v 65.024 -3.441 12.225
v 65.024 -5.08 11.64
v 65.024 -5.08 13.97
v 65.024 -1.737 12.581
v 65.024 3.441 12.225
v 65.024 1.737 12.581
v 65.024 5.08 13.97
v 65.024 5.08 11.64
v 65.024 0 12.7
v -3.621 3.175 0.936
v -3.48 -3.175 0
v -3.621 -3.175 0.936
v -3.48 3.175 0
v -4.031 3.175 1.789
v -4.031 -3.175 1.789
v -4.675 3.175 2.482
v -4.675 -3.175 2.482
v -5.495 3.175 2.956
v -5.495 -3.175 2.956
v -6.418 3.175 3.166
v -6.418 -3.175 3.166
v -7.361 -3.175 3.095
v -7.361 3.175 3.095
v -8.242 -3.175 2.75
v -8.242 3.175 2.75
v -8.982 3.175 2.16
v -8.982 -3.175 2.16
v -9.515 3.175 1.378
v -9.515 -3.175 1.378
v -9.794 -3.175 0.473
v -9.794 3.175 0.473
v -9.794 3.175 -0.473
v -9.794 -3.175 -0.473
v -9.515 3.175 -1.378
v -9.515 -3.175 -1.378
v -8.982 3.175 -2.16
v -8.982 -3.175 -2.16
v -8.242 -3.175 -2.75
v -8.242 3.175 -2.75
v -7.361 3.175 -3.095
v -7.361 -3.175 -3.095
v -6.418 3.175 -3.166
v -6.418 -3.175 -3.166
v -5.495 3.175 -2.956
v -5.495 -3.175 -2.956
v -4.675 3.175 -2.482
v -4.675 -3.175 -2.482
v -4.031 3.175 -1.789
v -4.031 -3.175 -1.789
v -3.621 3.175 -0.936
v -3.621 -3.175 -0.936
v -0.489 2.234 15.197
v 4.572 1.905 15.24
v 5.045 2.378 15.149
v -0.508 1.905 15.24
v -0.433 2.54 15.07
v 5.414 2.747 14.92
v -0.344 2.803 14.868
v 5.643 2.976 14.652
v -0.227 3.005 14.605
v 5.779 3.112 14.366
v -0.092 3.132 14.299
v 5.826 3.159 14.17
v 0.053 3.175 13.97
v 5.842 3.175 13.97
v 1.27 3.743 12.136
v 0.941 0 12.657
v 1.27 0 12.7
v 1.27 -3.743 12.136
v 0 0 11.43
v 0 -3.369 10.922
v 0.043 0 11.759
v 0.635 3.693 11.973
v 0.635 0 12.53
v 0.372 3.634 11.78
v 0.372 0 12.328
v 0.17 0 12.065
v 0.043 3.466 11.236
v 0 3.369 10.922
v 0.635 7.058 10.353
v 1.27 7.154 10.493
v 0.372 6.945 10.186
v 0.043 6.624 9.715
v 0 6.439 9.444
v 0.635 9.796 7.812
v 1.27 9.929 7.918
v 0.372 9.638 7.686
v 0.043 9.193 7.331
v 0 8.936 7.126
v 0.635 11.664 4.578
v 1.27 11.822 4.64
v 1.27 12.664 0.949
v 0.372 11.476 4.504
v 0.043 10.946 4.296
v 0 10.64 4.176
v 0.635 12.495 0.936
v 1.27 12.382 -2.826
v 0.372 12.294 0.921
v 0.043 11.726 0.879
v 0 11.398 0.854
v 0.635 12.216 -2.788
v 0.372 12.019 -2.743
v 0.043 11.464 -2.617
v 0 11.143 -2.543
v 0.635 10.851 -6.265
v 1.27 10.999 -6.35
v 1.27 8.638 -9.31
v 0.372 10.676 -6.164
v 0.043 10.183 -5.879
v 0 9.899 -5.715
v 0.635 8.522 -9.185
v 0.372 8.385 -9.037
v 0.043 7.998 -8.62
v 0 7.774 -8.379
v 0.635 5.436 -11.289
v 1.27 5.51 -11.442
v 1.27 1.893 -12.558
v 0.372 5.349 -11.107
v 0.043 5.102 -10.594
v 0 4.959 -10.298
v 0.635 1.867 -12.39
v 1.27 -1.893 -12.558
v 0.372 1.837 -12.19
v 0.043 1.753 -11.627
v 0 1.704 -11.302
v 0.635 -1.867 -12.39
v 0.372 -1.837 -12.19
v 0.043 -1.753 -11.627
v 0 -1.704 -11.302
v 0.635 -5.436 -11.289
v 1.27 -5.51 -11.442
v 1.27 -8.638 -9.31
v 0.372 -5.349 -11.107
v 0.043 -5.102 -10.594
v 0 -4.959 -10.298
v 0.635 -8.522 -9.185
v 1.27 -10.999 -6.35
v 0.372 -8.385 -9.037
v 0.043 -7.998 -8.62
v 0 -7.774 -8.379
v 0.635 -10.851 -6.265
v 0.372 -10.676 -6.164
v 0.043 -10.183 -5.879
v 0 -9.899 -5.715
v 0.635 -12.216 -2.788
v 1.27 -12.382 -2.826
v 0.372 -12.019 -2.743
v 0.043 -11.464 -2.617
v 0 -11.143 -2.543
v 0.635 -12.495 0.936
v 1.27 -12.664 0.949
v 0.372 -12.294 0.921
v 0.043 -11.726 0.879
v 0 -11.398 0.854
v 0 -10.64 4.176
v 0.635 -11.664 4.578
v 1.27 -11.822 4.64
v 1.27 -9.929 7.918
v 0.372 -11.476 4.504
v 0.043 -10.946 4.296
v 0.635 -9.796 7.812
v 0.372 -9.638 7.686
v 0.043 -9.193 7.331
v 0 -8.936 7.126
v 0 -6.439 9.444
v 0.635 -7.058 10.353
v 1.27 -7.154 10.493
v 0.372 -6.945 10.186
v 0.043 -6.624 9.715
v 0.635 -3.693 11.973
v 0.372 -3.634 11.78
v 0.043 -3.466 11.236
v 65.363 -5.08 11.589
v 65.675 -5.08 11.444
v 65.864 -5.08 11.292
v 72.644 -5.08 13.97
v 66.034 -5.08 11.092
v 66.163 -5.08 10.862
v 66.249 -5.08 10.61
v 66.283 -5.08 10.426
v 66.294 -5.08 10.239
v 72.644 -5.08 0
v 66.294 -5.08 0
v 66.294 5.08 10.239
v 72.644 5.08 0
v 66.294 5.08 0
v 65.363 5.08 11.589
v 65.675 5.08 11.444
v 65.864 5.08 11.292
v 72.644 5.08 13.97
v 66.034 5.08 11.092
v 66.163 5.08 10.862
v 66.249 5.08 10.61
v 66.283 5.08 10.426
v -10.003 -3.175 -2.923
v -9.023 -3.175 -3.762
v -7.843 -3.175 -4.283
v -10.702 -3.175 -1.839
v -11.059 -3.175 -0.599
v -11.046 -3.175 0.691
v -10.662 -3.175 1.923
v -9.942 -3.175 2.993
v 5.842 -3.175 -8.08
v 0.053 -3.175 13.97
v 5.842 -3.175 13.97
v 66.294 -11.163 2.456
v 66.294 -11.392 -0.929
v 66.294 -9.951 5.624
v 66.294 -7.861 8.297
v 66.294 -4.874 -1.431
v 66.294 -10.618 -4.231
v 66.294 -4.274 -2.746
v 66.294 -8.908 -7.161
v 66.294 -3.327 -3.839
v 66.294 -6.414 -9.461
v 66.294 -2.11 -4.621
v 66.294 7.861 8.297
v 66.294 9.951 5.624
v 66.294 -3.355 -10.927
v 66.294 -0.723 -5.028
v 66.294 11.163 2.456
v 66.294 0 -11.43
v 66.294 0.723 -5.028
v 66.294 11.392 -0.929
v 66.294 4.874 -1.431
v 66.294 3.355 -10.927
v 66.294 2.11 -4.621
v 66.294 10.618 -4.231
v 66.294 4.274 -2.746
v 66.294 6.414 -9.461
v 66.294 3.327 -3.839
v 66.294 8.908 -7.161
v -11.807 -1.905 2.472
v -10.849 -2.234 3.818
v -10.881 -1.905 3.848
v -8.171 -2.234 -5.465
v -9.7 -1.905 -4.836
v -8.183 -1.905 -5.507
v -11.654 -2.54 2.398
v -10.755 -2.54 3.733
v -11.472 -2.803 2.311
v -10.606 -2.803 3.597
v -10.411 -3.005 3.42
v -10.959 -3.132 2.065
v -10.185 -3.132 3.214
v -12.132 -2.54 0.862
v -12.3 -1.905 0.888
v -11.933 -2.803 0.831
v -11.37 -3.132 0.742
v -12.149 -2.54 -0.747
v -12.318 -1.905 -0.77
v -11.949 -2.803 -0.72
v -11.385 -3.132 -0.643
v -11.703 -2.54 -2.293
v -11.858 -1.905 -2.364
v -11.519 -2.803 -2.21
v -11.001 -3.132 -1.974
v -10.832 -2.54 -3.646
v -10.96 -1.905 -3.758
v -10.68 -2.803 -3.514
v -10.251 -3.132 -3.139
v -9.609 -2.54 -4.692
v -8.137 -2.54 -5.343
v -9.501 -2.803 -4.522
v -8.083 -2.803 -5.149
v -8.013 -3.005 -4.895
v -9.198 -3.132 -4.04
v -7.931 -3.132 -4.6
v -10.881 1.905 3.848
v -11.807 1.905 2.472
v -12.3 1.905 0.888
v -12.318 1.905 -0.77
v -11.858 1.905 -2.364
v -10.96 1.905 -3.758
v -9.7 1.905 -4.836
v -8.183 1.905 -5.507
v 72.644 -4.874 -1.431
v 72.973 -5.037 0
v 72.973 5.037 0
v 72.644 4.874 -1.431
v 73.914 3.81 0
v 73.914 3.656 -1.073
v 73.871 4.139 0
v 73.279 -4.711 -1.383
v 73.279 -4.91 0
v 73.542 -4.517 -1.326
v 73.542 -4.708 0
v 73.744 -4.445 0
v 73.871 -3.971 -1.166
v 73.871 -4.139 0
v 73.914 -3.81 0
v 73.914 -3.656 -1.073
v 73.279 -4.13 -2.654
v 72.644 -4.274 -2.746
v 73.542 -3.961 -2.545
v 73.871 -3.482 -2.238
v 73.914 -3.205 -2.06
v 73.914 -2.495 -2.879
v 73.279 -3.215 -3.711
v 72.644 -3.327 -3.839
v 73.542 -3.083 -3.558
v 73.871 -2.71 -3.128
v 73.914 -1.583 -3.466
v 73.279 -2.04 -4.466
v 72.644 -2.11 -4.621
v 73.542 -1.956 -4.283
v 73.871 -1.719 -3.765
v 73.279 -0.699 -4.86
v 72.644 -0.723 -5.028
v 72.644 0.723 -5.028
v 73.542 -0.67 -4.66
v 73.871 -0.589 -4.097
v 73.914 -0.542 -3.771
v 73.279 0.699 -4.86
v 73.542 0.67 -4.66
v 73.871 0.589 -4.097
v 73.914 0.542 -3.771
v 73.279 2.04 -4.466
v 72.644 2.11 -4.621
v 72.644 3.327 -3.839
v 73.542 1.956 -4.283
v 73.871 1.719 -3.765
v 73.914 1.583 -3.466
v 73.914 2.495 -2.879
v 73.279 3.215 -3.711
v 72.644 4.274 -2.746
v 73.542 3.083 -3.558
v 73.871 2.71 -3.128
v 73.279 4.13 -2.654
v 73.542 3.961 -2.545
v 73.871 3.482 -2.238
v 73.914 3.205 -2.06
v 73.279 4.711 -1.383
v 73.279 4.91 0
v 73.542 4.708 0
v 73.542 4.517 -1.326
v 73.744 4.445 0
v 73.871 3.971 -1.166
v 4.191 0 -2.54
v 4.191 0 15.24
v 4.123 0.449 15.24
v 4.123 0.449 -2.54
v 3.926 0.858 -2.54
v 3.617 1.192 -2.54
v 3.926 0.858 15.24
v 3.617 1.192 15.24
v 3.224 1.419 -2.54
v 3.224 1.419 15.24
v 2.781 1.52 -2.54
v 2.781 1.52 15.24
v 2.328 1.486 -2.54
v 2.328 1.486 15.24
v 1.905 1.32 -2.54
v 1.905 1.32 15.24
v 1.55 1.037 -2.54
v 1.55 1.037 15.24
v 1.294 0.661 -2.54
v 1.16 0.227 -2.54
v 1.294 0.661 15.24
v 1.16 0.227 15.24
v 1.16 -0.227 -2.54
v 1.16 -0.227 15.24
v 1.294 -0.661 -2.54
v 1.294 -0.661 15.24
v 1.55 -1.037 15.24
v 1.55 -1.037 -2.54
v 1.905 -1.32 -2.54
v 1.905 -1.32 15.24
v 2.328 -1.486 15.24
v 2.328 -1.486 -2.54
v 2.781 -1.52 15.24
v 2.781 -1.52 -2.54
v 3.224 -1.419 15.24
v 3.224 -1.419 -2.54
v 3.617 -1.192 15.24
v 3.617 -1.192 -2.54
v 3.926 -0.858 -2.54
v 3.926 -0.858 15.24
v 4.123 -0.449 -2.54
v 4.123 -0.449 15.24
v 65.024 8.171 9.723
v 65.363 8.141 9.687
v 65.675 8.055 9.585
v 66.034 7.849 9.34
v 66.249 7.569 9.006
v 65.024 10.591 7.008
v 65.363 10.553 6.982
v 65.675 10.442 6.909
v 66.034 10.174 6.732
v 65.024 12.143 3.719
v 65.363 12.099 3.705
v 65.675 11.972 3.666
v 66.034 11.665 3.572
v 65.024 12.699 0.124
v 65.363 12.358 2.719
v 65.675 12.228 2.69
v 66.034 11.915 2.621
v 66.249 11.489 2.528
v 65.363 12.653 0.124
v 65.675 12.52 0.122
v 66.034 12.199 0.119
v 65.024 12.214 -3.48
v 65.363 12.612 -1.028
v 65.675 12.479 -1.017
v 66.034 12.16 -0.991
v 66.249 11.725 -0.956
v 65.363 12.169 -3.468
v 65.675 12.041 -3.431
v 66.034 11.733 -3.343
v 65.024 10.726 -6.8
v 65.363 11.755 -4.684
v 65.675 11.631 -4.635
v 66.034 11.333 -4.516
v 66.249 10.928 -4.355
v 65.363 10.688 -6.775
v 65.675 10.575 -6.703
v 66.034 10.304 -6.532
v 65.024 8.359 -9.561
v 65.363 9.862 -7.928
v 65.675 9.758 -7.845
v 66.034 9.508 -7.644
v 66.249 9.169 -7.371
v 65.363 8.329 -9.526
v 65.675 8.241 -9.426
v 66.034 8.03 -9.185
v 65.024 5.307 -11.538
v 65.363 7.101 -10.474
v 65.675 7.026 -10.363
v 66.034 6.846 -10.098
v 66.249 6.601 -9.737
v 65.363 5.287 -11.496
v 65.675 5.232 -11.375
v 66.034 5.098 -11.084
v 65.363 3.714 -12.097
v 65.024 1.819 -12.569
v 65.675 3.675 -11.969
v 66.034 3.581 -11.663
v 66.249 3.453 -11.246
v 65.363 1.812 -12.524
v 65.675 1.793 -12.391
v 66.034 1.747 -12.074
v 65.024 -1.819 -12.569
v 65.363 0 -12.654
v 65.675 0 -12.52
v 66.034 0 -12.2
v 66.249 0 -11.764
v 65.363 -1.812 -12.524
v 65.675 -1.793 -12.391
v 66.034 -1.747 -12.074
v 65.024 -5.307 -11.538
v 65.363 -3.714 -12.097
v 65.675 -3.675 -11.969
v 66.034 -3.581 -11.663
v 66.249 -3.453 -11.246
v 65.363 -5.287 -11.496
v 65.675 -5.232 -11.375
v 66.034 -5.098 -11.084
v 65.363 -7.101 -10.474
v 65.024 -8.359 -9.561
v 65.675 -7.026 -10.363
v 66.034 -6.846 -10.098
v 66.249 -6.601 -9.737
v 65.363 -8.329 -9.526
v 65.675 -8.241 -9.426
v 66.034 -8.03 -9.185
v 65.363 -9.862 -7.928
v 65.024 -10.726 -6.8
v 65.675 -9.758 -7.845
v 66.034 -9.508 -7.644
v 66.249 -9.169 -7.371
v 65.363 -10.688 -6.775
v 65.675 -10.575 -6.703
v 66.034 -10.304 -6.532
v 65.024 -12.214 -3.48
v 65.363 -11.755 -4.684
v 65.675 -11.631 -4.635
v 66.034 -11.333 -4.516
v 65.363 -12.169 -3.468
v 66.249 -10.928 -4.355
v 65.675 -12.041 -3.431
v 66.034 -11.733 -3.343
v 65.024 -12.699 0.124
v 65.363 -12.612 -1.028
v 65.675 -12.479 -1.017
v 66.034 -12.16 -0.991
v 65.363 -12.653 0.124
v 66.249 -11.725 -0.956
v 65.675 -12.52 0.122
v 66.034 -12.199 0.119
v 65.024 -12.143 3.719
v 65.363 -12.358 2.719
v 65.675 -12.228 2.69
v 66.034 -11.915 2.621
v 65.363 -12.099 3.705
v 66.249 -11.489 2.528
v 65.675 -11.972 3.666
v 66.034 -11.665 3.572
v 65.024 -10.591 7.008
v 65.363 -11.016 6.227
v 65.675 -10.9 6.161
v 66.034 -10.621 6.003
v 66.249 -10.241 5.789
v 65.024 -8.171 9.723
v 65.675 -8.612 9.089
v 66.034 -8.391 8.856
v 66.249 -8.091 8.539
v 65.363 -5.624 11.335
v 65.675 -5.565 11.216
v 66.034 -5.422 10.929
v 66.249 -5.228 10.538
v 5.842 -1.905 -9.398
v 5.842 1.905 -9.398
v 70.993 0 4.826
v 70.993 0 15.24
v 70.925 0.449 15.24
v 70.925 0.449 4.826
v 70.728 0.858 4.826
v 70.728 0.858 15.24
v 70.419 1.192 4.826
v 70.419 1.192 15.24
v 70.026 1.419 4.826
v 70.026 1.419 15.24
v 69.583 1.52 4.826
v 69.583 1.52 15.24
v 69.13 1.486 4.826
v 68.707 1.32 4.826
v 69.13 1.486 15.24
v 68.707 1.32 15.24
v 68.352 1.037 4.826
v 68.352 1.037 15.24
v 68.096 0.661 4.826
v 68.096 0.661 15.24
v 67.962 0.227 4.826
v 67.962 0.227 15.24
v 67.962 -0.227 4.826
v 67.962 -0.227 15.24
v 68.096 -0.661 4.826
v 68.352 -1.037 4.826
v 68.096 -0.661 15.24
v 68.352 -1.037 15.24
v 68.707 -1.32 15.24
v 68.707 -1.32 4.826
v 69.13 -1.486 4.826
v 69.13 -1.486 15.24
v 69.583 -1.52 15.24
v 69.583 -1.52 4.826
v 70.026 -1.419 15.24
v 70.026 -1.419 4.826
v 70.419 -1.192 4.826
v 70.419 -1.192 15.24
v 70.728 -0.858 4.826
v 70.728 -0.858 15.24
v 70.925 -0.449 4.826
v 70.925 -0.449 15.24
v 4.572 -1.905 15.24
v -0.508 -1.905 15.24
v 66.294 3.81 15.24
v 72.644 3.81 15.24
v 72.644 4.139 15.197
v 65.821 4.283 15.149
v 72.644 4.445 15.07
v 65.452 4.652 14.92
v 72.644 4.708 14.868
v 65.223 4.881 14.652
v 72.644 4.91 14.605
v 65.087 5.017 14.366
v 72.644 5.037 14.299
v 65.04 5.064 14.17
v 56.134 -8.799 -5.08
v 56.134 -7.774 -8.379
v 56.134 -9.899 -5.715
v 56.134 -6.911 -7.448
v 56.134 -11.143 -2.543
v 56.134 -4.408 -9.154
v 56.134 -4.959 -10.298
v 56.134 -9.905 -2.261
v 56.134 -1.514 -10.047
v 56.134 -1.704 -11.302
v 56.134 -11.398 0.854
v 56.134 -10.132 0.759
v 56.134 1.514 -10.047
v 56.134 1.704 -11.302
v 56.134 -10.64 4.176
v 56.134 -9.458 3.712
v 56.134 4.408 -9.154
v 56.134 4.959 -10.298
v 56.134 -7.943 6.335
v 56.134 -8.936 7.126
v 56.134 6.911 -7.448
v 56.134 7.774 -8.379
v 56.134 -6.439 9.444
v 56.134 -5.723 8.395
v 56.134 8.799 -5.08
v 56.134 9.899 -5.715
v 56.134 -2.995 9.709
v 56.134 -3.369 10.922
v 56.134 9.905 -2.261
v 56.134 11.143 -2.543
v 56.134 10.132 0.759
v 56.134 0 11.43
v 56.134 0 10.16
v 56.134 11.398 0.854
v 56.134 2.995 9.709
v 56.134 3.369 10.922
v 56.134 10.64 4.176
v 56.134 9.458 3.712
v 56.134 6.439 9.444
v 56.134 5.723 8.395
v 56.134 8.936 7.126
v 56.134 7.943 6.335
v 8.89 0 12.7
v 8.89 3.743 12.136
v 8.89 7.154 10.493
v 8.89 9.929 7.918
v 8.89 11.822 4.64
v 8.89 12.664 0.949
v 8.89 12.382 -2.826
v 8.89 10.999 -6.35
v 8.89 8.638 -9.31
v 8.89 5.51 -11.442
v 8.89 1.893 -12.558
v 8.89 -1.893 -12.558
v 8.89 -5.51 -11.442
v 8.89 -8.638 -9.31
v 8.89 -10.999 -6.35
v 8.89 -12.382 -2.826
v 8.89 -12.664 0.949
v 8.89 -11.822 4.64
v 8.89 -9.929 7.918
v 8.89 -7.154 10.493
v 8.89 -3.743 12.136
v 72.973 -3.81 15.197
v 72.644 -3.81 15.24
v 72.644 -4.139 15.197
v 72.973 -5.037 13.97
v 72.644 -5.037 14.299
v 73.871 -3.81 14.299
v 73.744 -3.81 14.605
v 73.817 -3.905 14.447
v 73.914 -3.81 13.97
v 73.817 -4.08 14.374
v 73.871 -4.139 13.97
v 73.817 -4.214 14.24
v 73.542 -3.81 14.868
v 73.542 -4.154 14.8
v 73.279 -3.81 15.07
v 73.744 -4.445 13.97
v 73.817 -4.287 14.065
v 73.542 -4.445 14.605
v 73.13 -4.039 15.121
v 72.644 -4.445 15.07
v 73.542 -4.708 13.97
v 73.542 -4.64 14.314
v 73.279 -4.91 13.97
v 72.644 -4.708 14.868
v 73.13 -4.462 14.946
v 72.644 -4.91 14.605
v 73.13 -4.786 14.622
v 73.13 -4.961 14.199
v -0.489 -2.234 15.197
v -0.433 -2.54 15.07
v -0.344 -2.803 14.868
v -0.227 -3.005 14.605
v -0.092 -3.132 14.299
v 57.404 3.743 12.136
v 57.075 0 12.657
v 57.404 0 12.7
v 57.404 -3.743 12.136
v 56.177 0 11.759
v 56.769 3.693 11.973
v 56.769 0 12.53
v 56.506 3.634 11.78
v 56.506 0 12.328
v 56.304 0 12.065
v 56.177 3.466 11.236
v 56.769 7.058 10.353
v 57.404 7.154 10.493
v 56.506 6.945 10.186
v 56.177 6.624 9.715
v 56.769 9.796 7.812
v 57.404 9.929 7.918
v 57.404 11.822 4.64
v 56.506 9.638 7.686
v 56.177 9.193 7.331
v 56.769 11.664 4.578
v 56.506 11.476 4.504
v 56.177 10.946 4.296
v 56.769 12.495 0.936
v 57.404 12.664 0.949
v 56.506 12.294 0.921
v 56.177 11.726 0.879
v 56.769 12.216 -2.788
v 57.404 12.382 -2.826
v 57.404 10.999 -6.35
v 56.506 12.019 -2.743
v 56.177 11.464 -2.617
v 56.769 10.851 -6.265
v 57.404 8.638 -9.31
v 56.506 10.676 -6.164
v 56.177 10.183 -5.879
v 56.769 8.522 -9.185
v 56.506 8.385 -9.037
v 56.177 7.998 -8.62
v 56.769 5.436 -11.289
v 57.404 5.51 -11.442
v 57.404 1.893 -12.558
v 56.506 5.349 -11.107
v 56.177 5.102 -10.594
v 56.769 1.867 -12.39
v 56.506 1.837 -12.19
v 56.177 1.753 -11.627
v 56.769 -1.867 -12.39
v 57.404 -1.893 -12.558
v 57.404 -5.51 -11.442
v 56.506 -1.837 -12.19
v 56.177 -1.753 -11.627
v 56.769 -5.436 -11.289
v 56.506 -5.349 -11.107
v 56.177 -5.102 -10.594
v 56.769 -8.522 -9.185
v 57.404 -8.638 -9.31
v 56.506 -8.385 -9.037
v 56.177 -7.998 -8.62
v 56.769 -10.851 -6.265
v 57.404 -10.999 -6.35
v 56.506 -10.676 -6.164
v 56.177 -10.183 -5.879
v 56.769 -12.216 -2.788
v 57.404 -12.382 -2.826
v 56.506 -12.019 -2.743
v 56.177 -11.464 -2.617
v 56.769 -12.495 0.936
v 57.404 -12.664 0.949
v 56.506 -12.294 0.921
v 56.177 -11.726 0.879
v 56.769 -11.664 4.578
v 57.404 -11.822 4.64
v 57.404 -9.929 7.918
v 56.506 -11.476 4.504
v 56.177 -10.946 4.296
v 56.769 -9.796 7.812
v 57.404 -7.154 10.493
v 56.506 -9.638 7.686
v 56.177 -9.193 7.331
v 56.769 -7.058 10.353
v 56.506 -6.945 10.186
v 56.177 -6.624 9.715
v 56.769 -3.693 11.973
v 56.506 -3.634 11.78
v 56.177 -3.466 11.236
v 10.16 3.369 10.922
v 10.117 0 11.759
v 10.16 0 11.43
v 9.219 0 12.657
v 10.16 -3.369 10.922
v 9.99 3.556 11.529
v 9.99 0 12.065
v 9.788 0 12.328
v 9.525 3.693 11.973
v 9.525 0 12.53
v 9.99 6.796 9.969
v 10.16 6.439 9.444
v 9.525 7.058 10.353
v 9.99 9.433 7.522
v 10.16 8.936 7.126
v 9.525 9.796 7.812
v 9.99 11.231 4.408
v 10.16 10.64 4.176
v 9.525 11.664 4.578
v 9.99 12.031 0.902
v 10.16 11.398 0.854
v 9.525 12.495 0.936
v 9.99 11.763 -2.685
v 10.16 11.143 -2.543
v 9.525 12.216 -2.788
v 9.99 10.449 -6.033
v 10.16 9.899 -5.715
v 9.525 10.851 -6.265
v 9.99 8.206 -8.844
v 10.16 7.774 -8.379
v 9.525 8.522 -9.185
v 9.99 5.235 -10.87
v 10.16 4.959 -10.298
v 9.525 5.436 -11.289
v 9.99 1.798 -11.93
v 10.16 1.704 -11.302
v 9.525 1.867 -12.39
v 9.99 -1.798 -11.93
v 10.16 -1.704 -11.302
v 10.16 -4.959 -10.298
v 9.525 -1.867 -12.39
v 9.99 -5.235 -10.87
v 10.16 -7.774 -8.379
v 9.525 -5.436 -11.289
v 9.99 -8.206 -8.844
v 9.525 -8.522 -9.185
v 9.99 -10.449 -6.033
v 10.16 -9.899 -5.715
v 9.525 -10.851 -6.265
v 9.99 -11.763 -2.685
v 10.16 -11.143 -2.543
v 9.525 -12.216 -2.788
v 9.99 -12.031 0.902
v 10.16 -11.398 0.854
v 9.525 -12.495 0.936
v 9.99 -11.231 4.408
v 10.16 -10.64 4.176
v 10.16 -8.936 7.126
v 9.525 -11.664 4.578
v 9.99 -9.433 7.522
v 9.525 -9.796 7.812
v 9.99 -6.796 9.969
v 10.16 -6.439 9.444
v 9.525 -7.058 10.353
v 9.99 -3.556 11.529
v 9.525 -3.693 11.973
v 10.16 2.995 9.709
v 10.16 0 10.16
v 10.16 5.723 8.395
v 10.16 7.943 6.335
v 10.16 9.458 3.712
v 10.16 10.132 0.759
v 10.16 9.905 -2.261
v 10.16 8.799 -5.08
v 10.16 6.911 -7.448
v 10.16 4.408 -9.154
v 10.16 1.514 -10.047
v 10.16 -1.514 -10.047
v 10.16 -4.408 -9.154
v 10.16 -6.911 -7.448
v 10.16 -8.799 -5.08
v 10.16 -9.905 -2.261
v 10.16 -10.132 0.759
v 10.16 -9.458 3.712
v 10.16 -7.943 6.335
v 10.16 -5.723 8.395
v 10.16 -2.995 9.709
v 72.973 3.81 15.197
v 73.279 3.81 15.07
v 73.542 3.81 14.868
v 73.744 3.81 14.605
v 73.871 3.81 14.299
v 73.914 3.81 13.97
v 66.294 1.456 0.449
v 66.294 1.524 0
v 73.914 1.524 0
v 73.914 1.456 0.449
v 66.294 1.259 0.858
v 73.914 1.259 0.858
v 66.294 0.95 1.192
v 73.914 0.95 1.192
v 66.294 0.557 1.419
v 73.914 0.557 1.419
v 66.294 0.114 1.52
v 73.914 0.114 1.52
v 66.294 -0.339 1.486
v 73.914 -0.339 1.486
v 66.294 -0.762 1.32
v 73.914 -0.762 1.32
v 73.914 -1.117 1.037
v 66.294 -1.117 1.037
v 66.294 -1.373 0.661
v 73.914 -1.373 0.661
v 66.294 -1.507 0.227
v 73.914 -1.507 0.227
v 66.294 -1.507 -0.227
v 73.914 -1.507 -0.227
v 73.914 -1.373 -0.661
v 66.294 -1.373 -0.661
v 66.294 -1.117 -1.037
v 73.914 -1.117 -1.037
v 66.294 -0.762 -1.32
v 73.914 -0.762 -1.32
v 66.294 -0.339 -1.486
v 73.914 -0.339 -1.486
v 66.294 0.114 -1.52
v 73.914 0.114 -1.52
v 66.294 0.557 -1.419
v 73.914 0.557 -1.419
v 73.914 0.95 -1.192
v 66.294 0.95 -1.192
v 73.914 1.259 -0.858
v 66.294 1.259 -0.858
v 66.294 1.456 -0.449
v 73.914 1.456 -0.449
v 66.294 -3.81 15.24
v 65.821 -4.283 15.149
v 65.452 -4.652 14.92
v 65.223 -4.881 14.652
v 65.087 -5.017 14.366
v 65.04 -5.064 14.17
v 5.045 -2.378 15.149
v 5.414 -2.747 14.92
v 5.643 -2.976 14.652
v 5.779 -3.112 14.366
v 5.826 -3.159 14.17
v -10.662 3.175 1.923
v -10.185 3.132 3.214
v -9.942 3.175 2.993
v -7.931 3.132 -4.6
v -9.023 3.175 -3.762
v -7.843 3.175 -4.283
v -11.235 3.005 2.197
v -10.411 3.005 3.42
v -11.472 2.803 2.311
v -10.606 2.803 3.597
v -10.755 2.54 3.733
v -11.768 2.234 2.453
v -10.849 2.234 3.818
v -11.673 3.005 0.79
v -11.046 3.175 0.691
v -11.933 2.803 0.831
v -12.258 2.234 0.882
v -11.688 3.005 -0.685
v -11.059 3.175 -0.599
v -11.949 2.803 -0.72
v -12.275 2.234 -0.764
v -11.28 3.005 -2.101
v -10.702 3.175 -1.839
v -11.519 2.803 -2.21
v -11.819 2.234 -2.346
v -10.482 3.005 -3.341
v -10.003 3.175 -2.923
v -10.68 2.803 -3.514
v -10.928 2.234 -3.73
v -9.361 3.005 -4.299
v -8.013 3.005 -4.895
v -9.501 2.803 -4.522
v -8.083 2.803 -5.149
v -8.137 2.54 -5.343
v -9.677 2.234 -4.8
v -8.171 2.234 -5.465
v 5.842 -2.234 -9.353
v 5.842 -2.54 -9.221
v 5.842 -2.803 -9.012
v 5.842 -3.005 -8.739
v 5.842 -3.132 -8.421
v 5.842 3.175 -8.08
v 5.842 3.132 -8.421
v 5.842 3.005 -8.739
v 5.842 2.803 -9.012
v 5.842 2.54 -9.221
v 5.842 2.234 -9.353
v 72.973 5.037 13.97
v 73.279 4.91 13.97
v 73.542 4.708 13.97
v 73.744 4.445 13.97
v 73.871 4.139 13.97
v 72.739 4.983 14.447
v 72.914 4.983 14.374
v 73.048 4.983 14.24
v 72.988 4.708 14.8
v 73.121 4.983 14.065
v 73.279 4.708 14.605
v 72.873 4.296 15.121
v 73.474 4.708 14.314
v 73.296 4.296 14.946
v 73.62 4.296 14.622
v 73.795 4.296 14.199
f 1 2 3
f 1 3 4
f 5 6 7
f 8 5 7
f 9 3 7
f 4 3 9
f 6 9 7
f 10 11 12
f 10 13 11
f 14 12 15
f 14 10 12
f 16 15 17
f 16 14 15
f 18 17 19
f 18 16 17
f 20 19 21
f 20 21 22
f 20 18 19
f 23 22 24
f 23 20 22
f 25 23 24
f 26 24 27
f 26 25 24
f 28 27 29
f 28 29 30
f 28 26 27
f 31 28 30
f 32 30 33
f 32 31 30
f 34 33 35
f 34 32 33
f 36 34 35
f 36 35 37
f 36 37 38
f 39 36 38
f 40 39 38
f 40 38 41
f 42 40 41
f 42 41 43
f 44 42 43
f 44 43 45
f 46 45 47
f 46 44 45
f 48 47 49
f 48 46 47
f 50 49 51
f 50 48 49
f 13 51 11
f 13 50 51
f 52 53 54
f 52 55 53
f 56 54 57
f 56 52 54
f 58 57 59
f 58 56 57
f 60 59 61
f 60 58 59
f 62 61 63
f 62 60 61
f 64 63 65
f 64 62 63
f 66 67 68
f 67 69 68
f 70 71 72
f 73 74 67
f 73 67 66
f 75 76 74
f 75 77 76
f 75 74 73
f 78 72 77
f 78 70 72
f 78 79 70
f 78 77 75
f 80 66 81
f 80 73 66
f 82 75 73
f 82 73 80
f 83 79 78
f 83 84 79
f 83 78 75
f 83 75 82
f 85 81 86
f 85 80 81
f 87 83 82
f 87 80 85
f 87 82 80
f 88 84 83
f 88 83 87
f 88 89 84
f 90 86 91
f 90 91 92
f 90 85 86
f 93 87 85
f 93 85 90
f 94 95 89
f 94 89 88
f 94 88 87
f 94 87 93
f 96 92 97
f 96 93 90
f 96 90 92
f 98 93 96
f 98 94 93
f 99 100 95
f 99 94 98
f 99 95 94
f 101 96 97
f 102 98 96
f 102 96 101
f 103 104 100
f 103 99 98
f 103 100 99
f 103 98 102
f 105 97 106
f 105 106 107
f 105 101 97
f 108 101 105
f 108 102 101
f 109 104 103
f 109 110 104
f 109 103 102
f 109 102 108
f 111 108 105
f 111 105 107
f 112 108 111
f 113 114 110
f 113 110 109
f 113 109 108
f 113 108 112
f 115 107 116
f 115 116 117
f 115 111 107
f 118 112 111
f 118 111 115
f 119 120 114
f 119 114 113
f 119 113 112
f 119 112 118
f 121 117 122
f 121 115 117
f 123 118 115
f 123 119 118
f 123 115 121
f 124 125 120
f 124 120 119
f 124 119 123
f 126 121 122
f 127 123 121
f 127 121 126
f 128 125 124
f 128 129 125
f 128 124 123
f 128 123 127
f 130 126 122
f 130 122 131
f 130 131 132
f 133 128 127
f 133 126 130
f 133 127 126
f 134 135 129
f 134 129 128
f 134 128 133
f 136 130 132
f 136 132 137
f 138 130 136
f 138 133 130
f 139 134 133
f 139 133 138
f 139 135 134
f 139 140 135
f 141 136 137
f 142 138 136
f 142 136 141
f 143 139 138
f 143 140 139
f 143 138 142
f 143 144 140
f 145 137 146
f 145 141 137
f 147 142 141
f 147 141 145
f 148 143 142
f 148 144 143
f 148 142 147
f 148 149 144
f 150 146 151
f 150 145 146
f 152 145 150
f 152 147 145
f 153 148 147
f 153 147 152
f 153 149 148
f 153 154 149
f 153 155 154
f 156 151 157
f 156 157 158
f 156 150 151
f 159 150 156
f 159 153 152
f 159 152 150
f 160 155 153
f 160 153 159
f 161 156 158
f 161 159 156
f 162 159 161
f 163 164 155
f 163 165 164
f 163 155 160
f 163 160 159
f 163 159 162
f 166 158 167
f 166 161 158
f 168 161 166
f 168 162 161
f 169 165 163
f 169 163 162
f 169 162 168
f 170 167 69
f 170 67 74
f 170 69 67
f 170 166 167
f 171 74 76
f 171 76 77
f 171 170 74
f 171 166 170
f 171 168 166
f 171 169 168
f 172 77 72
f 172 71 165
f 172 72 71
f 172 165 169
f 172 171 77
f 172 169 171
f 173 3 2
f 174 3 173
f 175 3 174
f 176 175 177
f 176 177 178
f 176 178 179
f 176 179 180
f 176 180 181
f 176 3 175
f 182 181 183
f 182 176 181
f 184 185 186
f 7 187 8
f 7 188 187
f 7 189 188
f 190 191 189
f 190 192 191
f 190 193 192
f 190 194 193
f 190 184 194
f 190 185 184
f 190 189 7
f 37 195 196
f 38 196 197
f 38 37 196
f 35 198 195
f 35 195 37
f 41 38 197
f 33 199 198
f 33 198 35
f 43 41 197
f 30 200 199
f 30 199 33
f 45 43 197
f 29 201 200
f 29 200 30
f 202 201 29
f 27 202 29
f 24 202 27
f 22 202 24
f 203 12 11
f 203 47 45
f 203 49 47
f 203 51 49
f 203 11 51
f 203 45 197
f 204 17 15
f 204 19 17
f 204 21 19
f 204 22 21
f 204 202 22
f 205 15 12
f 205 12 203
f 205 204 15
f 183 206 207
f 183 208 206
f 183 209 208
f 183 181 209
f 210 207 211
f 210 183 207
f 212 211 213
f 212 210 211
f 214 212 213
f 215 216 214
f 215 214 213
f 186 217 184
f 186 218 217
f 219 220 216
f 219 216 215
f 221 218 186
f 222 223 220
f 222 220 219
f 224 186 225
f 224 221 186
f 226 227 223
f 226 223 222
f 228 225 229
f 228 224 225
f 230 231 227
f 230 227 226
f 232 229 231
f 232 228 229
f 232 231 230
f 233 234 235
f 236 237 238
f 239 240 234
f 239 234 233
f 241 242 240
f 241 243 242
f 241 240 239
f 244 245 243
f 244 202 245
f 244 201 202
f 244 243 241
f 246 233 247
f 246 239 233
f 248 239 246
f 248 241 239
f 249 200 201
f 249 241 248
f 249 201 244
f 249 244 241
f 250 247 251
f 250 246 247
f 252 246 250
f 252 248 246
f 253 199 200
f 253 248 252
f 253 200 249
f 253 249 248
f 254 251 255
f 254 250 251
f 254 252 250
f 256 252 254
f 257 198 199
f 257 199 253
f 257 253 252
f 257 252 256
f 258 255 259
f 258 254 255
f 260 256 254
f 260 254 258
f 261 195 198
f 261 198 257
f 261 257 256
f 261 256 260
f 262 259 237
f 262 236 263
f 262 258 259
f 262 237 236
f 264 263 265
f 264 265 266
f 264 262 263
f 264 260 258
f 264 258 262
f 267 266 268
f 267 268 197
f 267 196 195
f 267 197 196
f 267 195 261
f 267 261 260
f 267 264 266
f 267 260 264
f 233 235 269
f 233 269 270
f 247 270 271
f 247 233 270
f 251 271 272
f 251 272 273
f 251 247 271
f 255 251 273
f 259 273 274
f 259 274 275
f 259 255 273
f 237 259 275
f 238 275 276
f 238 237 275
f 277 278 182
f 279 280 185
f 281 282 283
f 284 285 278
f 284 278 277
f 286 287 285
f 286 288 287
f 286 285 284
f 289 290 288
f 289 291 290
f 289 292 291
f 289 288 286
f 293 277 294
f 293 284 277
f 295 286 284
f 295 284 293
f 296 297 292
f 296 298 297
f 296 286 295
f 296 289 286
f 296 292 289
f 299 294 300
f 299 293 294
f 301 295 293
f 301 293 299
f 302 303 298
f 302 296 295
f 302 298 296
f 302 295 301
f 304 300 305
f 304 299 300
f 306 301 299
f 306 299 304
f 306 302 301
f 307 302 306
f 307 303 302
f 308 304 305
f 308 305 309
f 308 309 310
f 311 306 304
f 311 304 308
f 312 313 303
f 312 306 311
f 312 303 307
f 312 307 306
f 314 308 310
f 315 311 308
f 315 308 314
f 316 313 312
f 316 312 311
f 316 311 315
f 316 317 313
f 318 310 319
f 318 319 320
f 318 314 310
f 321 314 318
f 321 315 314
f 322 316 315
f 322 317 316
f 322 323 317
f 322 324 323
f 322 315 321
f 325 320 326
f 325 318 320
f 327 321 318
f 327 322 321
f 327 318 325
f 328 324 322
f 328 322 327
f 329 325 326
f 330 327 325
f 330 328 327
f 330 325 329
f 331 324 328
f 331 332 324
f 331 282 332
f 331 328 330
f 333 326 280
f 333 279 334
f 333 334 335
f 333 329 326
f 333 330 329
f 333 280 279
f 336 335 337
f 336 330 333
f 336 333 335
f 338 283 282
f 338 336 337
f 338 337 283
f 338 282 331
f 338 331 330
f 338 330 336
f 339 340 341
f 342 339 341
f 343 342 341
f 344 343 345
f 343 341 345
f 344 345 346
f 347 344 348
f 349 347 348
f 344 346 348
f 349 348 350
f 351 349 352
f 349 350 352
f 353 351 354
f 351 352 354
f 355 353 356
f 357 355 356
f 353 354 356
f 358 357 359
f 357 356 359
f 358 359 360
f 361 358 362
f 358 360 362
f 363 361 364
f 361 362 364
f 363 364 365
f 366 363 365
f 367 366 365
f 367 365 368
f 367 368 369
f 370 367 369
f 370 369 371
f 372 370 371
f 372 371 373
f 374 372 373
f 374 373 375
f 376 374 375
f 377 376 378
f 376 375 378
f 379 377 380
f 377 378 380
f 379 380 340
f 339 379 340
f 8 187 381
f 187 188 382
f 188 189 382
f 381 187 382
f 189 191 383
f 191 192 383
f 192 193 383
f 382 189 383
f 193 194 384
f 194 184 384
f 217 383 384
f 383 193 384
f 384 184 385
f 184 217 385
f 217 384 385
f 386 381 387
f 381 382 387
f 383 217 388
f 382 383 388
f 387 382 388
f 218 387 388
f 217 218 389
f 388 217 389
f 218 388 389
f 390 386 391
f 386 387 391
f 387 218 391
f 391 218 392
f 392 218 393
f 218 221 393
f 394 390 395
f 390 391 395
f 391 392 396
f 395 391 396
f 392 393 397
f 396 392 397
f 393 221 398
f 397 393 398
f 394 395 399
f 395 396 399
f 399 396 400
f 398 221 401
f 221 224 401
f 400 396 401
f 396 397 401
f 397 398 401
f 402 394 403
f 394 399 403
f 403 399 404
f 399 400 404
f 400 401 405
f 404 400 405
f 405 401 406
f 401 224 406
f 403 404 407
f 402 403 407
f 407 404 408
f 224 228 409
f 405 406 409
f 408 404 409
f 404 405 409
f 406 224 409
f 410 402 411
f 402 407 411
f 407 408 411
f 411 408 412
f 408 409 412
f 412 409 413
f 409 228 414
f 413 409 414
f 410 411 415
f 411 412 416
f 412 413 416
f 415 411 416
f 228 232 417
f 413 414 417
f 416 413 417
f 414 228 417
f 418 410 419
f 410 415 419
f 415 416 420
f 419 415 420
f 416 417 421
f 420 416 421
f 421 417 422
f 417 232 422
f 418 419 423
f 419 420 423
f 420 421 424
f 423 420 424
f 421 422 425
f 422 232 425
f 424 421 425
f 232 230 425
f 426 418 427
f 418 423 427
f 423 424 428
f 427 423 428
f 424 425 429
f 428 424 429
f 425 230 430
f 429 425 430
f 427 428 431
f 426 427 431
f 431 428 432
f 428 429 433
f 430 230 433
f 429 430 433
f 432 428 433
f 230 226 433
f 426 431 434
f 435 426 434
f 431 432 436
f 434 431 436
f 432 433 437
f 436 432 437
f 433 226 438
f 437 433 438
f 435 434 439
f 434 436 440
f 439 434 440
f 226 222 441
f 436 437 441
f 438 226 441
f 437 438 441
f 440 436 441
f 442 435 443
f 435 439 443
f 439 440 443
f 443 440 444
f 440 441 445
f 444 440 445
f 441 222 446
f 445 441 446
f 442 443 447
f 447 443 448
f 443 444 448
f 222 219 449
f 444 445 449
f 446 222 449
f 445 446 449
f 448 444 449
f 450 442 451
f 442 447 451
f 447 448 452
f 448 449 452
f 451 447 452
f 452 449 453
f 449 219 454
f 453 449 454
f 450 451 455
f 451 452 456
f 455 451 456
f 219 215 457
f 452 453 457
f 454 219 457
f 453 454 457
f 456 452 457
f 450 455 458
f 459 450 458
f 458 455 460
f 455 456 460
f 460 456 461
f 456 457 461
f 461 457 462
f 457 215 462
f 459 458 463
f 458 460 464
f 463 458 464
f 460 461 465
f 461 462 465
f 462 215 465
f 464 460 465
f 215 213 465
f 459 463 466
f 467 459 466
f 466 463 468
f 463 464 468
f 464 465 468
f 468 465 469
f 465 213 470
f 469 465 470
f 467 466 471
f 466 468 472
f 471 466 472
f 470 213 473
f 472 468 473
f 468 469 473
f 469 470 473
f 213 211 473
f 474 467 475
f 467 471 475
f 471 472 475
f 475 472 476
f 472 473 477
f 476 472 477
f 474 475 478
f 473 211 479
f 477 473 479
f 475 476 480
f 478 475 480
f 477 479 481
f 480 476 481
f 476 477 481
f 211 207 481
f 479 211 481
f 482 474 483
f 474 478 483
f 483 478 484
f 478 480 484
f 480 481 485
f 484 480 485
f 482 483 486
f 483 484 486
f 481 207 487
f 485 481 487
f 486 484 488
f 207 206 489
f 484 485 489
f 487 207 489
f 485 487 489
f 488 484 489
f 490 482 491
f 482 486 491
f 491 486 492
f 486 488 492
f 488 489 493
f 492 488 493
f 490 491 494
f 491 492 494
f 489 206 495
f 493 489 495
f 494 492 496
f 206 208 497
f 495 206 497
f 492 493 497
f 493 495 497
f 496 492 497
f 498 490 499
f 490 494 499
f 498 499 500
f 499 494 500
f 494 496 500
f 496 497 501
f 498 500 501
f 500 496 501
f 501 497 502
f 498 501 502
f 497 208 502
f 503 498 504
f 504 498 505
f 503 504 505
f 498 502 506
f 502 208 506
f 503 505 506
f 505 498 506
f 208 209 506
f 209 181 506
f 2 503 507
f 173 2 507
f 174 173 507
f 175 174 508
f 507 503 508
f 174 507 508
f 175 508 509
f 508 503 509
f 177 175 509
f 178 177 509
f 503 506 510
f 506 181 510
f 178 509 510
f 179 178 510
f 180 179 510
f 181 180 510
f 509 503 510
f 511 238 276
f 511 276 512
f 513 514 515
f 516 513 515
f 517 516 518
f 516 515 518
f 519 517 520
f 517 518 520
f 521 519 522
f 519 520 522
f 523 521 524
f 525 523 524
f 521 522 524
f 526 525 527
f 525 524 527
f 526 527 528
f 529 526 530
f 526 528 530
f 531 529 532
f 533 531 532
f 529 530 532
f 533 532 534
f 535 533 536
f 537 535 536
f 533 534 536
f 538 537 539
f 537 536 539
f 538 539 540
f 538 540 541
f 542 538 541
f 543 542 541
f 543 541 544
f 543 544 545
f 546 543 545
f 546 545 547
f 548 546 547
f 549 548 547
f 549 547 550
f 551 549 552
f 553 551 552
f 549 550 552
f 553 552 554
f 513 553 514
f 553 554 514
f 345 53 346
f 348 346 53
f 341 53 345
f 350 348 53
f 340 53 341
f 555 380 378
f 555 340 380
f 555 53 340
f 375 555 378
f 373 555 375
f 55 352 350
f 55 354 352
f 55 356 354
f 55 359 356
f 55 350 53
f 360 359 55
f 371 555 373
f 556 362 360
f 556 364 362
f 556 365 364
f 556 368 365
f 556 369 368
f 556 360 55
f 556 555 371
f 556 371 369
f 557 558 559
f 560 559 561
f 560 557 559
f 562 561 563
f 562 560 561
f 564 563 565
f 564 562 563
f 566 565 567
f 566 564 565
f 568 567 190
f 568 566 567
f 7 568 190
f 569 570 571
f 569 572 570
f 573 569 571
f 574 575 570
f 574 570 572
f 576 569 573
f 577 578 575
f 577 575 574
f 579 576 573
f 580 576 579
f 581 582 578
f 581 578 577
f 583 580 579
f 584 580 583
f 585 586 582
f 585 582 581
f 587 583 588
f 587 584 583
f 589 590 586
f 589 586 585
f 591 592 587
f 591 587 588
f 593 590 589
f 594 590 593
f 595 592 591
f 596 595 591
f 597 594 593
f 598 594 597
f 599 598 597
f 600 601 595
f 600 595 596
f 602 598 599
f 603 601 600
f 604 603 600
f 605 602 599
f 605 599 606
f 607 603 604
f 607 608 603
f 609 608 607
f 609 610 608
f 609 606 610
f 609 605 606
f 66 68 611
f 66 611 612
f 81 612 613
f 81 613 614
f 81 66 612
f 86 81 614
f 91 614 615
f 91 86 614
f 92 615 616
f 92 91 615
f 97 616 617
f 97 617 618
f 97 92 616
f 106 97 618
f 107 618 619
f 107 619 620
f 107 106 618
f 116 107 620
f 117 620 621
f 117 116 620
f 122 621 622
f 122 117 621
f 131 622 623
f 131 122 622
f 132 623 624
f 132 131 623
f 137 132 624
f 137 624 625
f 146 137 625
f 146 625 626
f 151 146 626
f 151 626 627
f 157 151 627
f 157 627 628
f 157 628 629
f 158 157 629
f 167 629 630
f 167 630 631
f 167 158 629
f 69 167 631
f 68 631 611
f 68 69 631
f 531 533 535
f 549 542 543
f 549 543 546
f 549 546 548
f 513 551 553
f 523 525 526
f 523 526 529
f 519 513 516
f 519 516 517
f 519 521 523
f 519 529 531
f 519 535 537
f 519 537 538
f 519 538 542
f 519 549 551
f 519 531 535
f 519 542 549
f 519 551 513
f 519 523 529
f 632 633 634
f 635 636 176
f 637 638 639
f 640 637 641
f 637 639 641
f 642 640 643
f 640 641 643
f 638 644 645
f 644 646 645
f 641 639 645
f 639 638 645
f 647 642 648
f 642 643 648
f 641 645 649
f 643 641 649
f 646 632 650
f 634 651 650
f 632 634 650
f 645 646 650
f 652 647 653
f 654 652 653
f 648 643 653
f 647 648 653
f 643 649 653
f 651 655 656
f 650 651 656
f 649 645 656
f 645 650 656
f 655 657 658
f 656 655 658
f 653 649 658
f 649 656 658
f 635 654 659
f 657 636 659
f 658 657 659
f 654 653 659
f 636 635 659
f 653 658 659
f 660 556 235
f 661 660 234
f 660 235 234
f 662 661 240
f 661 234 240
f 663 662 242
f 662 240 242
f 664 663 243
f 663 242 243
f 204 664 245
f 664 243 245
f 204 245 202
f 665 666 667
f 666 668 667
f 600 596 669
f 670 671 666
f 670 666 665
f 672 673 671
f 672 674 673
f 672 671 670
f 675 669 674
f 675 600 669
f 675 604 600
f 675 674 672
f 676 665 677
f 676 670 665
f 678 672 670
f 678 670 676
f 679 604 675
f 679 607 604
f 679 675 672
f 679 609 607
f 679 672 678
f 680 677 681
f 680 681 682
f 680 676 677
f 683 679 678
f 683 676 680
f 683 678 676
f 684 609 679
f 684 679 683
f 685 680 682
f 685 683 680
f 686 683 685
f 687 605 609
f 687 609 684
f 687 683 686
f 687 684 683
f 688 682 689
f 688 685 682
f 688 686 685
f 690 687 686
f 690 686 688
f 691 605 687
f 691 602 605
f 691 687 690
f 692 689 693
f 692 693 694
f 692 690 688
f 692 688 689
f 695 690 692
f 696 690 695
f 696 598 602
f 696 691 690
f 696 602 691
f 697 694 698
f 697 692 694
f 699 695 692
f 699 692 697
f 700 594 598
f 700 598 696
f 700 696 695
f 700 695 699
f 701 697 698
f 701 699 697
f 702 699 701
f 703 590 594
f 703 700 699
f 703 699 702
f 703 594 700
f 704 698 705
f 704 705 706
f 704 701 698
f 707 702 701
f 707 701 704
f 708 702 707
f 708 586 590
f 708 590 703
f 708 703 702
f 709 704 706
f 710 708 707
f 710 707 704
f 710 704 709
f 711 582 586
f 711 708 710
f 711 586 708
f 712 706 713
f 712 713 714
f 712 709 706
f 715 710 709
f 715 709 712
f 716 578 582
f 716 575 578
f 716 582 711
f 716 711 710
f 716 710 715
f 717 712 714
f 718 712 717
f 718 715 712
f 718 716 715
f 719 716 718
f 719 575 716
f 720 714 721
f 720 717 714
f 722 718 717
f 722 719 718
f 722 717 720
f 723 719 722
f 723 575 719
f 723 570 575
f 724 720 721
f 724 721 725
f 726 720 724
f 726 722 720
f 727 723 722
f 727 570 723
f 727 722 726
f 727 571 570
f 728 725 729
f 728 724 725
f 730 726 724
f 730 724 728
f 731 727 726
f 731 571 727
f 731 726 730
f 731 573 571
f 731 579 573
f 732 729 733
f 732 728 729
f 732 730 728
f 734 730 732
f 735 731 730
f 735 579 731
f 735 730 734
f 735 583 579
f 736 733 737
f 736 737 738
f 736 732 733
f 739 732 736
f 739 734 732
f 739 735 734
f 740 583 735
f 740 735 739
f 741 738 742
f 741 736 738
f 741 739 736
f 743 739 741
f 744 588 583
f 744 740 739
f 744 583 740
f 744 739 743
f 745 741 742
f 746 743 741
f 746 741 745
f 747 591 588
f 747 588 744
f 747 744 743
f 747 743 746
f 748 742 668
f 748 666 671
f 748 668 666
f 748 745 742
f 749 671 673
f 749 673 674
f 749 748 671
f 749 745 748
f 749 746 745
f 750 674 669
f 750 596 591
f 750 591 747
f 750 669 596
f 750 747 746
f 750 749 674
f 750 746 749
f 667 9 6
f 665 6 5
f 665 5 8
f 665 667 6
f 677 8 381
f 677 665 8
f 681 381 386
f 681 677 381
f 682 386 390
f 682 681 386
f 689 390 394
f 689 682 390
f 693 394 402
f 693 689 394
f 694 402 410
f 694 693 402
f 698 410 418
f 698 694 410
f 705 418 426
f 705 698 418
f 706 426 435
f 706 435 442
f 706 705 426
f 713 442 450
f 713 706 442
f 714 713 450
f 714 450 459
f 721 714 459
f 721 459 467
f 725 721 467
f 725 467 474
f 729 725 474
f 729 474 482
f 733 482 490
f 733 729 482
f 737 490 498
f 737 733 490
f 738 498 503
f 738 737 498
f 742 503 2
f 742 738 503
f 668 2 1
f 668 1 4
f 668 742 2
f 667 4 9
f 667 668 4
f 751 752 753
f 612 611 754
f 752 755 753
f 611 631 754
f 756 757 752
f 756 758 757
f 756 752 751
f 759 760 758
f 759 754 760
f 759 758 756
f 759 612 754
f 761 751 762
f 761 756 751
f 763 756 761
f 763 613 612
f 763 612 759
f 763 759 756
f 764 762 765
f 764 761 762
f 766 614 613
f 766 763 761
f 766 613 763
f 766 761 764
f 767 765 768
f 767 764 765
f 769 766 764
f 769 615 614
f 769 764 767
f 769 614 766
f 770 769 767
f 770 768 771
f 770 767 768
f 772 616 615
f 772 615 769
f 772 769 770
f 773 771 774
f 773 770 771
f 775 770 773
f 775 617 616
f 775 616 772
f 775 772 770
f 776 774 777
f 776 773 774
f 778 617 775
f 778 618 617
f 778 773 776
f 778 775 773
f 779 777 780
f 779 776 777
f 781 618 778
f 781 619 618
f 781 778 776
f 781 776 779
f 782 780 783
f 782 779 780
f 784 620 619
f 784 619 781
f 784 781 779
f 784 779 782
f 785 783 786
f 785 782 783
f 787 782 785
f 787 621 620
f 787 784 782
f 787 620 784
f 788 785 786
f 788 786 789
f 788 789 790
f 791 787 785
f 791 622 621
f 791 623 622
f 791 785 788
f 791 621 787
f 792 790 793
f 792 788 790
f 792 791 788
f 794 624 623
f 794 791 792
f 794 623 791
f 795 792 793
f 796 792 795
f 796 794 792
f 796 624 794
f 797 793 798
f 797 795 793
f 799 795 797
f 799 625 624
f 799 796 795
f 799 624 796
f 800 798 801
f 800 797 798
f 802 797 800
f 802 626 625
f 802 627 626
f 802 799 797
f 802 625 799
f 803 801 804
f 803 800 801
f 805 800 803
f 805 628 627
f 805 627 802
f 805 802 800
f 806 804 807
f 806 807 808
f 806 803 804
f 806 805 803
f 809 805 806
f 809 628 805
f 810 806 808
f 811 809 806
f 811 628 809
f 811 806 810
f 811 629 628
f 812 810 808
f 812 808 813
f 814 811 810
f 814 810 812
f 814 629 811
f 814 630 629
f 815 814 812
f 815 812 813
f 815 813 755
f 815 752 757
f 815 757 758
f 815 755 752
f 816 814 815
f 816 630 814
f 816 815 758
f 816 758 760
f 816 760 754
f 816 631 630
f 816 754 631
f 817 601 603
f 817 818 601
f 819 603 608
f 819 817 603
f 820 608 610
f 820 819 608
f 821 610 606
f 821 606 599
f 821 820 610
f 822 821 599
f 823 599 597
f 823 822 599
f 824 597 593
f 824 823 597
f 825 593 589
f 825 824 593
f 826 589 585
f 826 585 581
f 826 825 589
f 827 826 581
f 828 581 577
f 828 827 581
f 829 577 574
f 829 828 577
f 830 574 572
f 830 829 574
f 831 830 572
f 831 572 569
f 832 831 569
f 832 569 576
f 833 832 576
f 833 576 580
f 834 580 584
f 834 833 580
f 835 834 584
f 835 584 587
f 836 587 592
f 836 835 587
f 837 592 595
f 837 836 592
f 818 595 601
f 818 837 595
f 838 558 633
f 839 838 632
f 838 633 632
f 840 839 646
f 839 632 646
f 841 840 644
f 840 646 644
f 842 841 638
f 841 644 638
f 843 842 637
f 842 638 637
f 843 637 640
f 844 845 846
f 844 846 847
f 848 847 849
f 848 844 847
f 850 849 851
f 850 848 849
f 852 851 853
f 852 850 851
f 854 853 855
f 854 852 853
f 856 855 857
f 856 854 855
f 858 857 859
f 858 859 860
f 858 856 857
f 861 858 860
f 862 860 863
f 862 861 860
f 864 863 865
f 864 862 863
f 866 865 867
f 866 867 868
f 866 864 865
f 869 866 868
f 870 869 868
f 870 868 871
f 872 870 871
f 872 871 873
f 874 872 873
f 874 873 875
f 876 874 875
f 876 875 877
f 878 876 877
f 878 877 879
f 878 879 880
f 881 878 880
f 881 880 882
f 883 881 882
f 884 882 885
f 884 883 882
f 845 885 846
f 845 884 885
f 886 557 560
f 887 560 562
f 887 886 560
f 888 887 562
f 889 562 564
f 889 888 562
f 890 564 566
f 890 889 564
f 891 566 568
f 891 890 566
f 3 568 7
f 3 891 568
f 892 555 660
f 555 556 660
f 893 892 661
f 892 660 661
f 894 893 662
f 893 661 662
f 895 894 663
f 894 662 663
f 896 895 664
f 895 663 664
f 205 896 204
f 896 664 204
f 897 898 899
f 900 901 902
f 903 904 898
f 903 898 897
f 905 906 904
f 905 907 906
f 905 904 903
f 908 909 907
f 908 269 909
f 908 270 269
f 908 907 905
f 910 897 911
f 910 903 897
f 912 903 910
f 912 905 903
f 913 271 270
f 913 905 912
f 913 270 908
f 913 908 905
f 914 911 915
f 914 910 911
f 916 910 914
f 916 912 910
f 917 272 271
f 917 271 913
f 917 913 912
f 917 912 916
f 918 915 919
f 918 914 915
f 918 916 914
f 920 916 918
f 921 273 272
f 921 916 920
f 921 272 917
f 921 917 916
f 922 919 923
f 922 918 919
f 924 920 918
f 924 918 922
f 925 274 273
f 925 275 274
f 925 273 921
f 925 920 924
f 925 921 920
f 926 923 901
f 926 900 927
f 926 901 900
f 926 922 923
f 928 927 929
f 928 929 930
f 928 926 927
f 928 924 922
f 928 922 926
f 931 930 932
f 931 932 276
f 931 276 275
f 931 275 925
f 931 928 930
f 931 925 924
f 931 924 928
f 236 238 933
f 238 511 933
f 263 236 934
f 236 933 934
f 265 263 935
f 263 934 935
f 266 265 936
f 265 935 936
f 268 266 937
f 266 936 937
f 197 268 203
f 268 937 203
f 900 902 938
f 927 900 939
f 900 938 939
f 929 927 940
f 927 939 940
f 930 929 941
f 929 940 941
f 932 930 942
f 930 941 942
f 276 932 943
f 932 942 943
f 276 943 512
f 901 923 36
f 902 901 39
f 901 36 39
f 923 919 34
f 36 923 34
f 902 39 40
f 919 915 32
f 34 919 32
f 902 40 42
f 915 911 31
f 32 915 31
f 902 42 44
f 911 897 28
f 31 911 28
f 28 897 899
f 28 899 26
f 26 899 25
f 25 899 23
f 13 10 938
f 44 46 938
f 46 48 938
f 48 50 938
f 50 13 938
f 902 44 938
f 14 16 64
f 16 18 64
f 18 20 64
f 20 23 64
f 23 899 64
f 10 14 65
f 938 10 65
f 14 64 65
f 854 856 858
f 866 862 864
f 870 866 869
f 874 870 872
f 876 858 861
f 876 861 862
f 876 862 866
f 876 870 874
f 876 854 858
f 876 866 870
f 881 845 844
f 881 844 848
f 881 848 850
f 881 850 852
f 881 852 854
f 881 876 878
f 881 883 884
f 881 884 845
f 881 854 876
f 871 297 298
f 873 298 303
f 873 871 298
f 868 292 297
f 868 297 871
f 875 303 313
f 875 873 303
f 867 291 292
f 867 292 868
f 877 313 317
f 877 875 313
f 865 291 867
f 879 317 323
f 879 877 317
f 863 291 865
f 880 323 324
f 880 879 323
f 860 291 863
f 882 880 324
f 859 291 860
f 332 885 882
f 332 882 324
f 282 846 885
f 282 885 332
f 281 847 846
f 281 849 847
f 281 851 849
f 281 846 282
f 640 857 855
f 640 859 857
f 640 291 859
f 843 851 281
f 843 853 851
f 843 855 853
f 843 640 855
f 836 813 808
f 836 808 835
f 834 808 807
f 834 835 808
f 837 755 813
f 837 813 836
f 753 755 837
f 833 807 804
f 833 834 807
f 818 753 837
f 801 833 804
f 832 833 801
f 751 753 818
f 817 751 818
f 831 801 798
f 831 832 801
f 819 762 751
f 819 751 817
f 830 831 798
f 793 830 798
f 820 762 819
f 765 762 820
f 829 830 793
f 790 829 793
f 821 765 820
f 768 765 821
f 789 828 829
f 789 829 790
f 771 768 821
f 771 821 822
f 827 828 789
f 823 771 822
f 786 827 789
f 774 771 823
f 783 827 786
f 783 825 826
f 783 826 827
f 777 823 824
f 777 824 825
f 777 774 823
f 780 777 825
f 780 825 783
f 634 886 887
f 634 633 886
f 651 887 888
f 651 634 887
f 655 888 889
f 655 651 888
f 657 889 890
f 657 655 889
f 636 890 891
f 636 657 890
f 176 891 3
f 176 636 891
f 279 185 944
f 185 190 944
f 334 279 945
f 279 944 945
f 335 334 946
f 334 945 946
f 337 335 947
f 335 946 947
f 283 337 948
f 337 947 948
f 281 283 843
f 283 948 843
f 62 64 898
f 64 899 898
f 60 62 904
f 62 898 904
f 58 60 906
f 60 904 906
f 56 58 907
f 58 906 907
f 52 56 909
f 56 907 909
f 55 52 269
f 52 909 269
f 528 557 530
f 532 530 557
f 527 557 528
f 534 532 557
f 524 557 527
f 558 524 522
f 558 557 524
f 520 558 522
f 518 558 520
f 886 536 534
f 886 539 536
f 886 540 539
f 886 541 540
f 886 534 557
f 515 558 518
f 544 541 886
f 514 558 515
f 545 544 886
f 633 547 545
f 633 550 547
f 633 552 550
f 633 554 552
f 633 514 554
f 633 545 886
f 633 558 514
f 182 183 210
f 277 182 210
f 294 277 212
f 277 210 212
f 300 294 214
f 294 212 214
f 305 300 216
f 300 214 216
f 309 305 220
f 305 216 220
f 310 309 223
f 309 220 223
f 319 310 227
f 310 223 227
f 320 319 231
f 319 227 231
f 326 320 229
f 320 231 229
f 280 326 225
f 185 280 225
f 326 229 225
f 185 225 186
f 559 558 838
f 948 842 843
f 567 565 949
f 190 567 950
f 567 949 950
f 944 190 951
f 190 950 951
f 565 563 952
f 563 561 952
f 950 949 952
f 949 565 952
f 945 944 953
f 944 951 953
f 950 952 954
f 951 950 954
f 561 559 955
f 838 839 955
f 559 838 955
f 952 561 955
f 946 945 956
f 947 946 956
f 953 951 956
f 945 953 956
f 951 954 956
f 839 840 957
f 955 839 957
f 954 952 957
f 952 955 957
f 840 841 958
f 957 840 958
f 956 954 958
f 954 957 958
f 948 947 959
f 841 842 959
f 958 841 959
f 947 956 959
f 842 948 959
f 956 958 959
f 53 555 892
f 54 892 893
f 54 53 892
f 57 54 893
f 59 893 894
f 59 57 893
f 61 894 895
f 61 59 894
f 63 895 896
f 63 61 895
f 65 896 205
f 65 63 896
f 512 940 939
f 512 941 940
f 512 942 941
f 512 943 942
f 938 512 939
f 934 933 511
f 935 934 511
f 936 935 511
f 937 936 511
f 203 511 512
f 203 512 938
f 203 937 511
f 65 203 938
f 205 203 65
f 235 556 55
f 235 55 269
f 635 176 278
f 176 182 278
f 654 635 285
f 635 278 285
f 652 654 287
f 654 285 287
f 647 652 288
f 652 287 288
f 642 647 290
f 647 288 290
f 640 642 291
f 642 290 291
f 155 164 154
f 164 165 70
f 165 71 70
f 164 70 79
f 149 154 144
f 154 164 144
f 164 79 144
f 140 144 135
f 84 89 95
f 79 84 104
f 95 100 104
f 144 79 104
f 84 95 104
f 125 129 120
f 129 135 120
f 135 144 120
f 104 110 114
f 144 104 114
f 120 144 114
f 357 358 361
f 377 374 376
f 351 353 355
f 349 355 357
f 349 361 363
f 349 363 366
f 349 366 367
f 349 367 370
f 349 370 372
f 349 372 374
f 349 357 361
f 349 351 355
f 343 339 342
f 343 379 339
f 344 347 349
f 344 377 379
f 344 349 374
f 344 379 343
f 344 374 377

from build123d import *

# Parameters (mm, degrees)
F0_W     = 5.842
F0_H     = 12.7
F0_R     = 3.175
F2_DEPTH = 3.175
F3_R     = 1.524
F4_DEPTH = 7.62
F5_DEPTH = 1.27
F6_R     = 1.524
F7_DEPTH = 10.414
F8_R     = 1.524
F9_DEPTH = 17.78
F10_R    = 1.27
F10_2_R  = 1.27


with BuildPart() as f1:
    # F0 (on Front) → F1 (revolve)
    with BuildSketch(Plane.XZ):
        Polygon((5.842, 12.7), (5.842, 0), (66.294, 0), (66.294, 12.7), (56.134, 12.7), (56.134, 10.16), (10.16, 10.16), (10.16, 12.7), align=None)
        with Locations((2.921, 6.35)):
            Rectangle(F0_W, F0_H)
    revolve(axis=Axis((33.147, 0, 0), (-1, 0, 0)))

    # F3 (on face) → F4 (join)
    with BuildSketch(Plane.YZ.offset(66.294)):
        with BuildLine():
            ThreePointArc((-5.08, 11.6397422652), (0, 12.7), (5.08, 11.6397422652))
            Line((5.08, 11.6397422652), (5.08, 15.24))
            Line((5.08, 15.24), (-5.08, 15.24))
            Line((-5.08, 15.24), (-5.08, 11.6397422652))
        make_face()
        with BuildLine():
            ThreePointArc((-5.08, 0), (0, 5.08), (5.08, 0))
            Line((5.08, 0), (5.08, 11.6397422652))
            ThreePointArc((5.08, 11.6397422652), (0, 12.7), (-5.08, 11.6397422652))
            Line((-5.08, 11.6397422652), (-5.08, 0))
        make_face()
        with BuildLine():
            ThreePointArc((-5.08, 0), (0, -5.08), (5.08, 0))
            ThreePointArc((5.08, 0), (0, 5.08), (-5.08, 0))
        make_face()
        Circle(F3_R, mode=Mode.SUBTRACT)
    extrude(amount=F4_DEPTH)

    # F3 (on face) → F5 (join)
    with BuildSketch(Plane.YZ.offset(66.294)):
        with BuildLine():
            ThreePointArc((-5.08, 11.6397422652), (0, 12.7), (5.08, 11.6397422652))
            Line((5.08, 11.6397422652), (5.08, 15.24))
            Line((5.08, 15.24), (-5.08, 15.24))
            Line((-5.08, 15.24), (-5.08, 11.6397422652))
        make_face()
        with BuildLine():
            ThreePointArc((-5.08, 0), (0, 5.08), (5.08, 0))
            Line((5.08, 0), (5.08, 11.6397422652))
            ThreePointArc((5.08, 11.6397422652), (0, 12.7), (-5.08, 11.6397422652))
            Line((-5.08, 11.6397422652), (-5.08, 0))
        make_face()
        with BuildLine():
            ThreePointArc((-5.08, 0), (0, -5.08), (5.08, 0))
            ThreePointArc((5.08, 0), (0, 5.08), (-5.08, 0))
        make_face()
        Circle(F3_R, mode=Mode.SUBTRACT)
    extrude(amount=-F5_DEPTH)

    # F6 (on face) → F7 (cut)
    with BuildSketch(Plane.XY.offset(15.24)):
        with Locations((69.469, 0)):
            Circle(F6_R)
    extrude(amount=-F7_DEPTH, mode=Mode.SUBTRACT)

    # F10#2
    f10_2_edges = [f1.edges().sort_by_distance(p)[0] for p in [
        (0, 0, -12.7),
        (10.16, 0, -12.7),
        (56.134, 0, -12.7),
        (66.294, 0, -12.7),
        (69.469, -5.08, 15.24),
        (65.024, 0, 15.24),
        (73.914, 0, 15.24),
        (69.469, 5.08, 15.24),
        (73.914, -5.08, 7.62),
    ]]
    fillet(f10_2_edges, radius=F10_2_R)


with BuildPart() as f2:
    # F0 (on Front) → F2 (new body, symmetric)
    with BuildSketch(Plane.XZ):
        with BuildLine():
            Line((5.842, 0), (0, 0))
            Line((0, 0), (-0.9398, 0))
            ThreePointArc((-0.9398, 0), (-3.1957909266, -4.5493385486), (-8.1826630726, -5.5069827884))
            Line((-8.1826630726, -5.5069827884), (5.842, -9.398))
            Line((5.842, -9.398), (5.842, 0))
        make_face()
        with BuildLine():
            ThreePointArc((-8.1826630726, -5.5069827884), (-3.1957909266, -4.5493385486), (-0.9398, 0))
            ThreePointArc((-0.9398, 0), (-4.5919612295, 5.3297205562), (-10.8806298187, 3.8475430269))
            ThreePointArc((-10.8806298187, 3.8475430269), (-12.1459778134, -1.5837270034), (-8.1826630726, -5.5069827884))
        make_face()
        with Locations((-6.6548, 0)):
            Circle(F0_R, mode=Mode.SUBTRACT)
        with BuildLine():
            Line((-0.9398, 0), (0, 0))
            Line((0, 0), (0, 12.7))
            Line((0, 12.7), (5.842, 12.7))
            Line((5.842, 12.7), (5.842, 15.24))
            Line((5.842, 15.24), (-0.508, 15.24))
            Line((-0.508, 15.24), (-10.8806298187, 3.8475430269))
            ThreePointArc((-10.8806298187, 3.8475430269), (-4.5919612295, 5.3297205562), (-0.9398, 0))
        make_face()
        with Locations((2.921, 6.35)):
            Rectangle(F0_W, F0_H)
    extrude(amount=F2_DEPTH, both=True)

    # F8 (on face) → F9 (cut)
    with BuildSketch(Plane.XY.offset(15.24)):
        with Locations((2.667, 0)):
            Circle(F8_R)
    extrude(amount=-F9_DEPTH, mode=Mode.SUBTRACT)

    # F10
    f10_edges = [f2.edges().sort_by_distance(p)[0] for p in [
        (2.667, 3.175, 15.24),
        (2.667, -3.175, 15.24),
        (5.842, 0, 15.24),
        (-5.694315, -3.175, 9.543772),
        (-5.694315, 3.175, 9.543772),
        (-12.145978, 3.175, -1.583727),
    ]]
    fillet(f10_edges, radius=F10_R)


solid = Compound([f1.part, f2.part])
